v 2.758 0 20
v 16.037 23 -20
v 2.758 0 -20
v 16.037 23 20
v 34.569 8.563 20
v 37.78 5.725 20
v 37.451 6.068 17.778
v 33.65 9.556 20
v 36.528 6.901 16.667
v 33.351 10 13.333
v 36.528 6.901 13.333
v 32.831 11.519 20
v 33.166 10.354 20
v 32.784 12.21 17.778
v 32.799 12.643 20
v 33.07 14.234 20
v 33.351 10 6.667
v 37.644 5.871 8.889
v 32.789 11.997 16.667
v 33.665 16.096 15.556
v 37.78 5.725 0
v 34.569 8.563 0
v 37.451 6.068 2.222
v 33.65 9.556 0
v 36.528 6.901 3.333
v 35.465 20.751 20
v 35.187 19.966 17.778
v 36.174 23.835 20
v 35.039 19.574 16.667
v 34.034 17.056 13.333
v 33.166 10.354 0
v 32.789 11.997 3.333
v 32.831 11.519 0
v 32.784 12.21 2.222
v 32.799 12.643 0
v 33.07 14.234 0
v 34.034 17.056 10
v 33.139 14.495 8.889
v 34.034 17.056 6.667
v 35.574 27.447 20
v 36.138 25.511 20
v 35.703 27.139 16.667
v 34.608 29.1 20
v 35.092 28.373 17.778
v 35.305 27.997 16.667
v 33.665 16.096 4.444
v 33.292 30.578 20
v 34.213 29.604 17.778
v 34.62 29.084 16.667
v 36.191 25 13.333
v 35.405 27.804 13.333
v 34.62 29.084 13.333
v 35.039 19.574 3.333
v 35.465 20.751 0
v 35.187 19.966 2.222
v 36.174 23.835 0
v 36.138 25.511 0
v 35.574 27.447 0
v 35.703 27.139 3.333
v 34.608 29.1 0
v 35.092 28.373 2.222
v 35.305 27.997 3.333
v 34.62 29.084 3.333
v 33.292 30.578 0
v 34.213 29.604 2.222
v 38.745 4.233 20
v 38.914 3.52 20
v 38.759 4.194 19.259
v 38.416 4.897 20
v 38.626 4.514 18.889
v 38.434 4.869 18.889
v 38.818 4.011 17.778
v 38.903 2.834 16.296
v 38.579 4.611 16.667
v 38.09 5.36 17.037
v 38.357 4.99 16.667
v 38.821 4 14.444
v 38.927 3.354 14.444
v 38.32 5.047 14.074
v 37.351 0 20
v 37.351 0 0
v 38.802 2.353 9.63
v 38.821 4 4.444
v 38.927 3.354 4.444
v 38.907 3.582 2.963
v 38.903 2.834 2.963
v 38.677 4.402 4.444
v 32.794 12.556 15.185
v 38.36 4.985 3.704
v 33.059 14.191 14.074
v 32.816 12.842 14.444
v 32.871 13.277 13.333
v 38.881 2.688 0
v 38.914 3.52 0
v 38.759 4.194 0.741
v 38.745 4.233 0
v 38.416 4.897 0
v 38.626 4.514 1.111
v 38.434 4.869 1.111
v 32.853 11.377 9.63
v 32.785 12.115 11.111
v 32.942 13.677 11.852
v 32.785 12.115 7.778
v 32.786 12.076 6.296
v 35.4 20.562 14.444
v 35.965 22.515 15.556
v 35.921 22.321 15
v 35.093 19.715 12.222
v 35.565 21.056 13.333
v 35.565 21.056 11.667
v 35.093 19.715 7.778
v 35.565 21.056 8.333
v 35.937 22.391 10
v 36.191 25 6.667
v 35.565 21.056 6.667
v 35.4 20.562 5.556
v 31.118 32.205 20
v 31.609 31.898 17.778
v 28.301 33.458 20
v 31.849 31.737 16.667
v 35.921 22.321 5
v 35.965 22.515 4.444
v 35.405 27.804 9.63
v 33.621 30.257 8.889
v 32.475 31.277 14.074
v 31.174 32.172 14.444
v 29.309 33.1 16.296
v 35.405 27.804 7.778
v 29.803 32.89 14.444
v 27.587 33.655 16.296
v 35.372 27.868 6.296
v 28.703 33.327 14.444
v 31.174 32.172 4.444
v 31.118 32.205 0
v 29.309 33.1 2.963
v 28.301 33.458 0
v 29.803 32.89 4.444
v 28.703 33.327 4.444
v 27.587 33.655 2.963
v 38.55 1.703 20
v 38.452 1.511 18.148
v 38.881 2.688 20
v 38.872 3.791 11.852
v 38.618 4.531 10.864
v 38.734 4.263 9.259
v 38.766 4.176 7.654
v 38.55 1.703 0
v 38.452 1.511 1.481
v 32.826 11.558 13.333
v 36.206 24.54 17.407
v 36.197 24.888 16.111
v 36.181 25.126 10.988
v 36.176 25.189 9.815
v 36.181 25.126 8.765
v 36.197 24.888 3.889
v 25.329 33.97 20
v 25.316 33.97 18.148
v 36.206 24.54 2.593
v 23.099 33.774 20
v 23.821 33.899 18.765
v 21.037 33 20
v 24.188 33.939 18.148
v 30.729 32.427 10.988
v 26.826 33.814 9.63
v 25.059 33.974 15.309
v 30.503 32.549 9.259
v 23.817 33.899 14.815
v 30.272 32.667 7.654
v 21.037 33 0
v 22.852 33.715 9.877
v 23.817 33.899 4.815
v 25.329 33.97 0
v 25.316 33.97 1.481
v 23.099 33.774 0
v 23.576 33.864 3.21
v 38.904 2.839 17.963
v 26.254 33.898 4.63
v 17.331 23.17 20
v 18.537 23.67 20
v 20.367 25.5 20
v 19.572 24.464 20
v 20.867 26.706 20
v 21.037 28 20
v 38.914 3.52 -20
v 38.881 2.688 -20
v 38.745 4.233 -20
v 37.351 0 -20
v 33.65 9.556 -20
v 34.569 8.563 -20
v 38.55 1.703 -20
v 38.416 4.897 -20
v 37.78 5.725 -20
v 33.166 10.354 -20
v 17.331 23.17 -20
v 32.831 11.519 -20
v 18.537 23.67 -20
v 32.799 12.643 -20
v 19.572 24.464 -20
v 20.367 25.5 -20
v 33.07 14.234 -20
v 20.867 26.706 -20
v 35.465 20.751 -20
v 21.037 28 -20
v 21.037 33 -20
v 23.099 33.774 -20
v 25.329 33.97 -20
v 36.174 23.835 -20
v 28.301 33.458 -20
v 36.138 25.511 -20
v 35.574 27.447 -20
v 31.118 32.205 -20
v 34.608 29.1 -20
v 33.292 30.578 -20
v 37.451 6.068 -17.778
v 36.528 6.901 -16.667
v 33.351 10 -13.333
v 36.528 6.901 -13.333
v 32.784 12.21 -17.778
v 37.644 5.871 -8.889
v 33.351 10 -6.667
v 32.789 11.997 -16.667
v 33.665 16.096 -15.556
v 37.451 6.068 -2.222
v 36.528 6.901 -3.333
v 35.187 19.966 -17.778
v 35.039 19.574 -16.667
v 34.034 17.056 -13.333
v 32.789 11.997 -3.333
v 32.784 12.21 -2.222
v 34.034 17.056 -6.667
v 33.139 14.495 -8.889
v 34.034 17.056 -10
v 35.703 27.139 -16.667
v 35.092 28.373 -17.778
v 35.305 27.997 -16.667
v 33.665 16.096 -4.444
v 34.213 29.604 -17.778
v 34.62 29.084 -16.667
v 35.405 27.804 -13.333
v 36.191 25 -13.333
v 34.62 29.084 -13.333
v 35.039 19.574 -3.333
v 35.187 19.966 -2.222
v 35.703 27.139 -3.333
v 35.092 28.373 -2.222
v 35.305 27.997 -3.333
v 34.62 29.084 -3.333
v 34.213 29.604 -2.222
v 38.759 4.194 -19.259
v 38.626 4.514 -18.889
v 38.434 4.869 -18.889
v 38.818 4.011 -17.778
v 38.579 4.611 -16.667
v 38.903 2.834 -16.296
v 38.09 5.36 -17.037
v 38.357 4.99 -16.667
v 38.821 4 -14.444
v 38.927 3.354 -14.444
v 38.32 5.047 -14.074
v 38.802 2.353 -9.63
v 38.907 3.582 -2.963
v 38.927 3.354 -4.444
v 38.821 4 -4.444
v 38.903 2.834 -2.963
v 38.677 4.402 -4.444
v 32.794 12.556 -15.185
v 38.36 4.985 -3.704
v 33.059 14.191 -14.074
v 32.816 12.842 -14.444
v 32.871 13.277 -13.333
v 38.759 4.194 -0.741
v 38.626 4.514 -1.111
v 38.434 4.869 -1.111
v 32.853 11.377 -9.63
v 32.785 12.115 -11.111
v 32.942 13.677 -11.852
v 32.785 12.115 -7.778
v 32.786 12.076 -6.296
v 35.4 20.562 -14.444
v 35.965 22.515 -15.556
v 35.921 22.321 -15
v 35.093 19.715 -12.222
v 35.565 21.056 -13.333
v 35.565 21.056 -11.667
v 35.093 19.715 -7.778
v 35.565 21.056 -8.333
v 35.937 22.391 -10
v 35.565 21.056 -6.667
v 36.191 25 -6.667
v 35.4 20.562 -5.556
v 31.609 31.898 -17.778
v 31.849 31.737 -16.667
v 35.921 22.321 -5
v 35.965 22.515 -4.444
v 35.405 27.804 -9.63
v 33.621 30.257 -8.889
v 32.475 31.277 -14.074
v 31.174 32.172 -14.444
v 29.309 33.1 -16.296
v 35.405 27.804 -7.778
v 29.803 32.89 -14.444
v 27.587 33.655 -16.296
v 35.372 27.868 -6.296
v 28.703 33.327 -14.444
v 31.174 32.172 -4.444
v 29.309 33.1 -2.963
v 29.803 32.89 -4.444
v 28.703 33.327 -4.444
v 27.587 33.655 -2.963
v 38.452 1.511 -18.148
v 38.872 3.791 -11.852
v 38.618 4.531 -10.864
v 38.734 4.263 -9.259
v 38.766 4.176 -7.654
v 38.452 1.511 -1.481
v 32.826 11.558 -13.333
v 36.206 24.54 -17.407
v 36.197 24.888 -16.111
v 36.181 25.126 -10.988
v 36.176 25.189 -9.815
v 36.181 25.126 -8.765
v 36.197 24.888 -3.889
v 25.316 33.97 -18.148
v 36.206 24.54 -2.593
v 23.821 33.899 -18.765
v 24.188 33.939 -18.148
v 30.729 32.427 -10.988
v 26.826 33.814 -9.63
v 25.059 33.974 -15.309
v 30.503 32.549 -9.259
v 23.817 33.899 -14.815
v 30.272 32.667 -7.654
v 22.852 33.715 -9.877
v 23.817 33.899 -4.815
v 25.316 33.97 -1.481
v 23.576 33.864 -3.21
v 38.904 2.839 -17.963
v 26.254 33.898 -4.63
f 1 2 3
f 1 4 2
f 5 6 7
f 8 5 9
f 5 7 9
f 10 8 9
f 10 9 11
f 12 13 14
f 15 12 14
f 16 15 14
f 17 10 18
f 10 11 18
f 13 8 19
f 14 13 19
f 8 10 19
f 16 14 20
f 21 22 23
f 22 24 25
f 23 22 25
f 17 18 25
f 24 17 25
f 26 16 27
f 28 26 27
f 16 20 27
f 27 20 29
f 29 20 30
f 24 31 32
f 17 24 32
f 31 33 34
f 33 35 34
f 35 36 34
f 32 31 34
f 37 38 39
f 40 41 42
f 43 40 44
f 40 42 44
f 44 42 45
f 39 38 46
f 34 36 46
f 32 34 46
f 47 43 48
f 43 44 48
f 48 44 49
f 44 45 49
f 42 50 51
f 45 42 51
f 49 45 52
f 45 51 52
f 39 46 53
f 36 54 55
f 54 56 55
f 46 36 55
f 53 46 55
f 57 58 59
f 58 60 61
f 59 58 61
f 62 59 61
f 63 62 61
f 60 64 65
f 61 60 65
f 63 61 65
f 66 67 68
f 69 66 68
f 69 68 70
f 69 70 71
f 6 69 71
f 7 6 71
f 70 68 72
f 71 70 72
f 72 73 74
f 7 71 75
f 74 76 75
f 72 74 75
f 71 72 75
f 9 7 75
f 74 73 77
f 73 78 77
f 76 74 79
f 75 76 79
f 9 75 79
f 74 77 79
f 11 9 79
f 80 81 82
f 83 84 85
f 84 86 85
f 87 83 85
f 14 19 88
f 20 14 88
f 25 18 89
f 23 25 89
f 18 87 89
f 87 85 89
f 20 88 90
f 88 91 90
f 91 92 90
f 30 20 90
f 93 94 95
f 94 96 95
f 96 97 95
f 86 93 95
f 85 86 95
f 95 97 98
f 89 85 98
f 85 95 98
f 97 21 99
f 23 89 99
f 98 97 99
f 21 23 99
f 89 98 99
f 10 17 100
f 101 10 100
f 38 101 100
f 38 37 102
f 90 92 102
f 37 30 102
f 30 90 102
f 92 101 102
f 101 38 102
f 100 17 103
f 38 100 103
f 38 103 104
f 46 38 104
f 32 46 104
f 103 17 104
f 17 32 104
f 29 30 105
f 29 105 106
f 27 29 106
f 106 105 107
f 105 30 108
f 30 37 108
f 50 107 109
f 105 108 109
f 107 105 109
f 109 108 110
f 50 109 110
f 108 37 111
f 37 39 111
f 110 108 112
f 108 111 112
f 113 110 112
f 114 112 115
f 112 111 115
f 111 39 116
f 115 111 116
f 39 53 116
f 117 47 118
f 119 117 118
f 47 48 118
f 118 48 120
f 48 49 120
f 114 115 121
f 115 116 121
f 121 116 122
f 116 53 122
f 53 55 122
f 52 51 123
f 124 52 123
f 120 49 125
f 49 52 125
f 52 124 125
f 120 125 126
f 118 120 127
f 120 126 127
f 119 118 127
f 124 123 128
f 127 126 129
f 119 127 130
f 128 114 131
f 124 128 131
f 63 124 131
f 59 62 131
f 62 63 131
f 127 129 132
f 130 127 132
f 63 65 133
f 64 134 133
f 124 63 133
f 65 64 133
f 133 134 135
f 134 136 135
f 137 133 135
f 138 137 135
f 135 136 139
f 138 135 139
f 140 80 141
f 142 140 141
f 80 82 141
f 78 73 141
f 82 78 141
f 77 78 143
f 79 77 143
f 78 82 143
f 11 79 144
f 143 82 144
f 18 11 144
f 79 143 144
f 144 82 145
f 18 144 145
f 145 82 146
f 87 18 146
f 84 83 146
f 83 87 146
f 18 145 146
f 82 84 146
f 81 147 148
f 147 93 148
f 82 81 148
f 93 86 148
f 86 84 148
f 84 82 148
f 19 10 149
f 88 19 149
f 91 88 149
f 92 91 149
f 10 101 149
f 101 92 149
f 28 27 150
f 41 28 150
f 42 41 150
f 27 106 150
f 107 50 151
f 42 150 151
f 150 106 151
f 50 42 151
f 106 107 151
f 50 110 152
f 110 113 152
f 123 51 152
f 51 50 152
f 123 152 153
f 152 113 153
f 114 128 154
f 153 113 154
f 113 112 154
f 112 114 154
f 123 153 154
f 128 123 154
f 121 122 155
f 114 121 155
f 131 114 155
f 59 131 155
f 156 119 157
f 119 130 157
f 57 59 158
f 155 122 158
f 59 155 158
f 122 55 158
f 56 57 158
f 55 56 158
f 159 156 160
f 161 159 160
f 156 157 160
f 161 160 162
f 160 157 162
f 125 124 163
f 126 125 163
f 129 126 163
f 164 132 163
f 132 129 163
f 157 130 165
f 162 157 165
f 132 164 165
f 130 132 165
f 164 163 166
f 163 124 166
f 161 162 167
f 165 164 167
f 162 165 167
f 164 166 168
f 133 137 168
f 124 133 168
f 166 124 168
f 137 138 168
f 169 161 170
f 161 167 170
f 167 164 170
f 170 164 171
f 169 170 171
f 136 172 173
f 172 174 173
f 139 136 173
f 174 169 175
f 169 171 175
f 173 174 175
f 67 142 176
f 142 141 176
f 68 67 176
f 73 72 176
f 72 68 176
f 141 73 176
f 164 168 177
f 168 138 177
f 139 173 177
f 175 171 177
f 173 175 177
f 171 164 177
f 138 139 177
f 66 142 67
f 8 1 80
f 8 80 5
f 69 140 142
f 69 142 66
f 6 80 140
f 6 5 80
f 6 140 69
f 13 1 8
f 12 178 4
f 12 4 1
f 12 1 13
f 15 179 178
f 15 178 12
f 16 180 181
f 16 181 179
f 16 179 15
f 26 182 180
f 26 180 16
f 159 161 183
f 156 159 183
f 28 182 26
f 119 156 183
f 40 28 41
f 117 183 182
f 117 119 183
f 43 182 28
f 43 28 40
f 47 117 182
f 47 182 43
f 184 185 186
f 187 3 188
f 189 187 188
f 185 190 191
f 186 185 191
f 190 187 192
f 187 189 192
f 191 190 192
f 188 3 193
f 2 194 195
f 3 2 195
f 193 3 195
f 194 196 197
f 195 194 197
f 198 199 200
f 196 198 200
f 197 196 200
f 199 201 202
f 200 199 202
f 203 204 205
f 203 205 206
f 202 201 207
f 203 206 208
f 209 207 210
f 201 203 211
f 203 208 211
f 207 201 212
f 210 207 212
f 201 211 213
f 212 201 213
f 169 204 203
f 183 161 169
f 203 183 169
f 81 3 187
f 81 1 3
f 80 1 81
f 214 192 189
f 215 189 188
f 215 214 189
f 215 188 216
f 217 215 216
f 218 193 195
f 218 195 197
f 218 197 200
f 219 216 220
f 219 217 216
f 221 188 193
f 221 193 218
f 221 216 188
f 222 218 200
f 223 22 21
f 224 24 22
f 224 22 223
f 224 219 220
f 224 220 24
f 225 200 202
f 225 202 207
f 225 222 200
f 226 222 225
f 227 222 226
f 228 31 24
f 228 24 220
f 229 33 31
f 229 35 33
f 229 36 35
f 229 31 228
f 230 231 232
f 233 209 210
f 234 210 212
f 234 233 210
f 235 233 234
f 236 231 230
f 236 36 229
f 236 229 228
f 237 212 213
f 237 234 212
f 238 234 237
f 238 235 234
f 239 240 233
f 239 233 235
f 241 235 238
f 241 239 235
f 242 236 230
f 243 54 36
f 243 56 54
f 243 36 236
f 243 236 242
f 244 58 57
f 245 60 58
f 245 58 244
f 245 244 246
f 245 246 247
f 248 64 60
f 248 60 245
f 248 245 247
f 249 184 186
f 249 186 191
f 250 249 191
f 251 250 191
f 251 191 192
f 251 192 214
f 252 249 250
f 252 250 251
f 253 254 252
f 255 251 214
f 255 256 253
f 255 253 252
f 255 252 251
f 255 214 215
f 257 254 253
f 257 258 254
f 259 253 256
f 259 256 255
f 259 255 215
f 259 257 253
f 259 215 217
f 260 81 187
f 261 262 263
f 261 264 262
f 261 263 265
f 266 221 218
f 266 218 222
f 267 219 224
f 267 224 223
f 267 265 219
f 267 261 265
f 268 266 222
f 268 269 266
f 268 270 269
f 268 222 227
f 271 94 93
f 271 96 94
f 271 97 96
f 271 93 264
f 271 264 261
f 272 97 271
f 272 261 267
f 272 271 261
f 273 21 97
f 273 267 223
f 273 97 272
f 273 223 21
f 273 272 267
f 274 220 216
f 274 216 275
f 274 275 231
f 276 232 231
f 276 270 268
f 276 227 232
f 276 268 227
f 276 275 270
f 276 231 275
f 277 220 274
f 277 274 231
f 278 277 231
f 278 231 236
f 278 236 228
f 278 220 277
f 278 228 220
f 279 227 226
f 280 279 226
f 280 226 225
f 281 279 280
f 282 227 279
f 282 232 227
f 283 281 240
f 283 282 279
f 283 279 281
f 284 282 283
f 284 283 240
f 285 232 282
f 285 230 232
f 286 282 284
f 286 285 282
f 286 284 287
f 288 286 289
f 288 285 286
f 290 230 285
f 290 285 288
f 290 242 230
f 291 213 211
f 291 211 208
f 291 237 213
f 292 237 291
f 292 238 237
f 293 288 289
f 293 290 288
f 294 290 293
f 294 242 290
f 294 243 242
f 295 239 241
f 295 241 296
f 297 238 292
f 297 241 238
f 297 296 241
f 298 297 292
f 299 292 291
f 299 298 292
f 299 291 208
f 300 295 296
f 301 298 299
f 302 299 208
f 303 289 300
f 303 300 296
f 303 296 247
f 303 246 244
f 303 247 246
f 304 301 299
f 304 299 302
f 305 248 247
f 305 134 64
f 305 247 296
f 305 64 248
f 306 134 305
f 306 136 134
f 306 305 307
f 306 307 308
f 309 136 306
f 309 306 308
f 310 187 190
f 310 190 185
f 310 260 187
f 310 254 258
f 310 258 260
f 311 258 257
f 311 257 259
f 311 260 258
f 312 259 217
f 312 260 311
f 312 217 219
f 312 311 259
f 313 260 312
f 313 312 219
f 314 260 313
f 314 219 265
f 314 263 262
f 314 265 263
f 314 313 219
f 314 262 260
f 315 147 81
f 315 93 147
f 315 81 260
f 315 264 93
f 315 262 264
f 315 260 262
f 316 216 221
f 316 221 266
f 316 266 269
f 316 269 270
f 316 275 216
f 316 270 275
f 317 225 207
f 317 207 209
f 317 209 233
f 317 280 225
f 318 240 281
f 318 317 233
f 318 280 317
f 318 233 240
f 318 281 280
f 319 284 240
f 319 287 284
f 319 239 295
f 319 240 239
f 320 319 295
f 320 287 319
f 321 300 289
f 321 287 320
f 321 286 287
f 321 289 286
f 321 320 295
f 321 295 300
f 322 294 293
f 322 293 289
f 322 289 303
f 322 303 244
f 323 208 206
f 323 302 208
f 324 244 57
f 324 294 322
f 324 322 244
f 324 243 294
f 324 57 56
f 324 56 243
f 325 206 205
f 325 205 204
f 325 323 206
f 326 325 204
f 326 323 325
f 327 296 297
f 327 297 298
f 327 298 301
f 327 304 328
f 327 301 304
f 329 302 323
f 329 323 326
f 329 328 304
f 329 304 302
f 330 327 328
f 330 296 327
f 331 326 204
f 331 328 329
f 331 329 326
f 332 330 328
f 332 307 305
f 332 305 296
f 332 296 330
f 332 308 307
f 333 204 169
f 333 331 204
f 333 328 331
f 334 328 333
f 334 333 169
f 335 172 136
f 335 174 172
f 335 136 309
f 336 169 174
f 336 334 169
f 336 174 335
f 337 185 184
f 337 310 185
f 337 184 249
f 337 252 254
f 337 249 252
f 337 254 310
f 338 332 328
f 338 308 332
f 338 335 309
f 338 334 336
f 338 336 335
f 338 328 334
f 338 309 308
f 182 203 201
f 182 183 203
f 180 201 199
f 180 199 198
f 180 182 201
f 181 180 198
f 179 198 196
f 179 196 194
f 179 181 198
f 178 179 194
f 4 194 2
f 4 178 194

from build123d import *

# Parameters (mm, degrees)
BOSS_EXTRU_1_DEPTH = 20


with BuildPart() as part:
    # Esquisse1 → Boss.-Extru.1 (new, symmetric)
    with BuildSketch(Plane.XY):
        with BuildLine():
            Line((2.757835538, 0), (37.350688144, 0))
            add(Edge.make_bspline(
                [(37.350688144, 0), (41.962405292, 5.087288514), (26.683241818, 9.133861582), (43.232235369, 27.239644515), (26.656278771, 36.134424551), (21.036891729, 33)],
                knots=[0, 0, 0, 0, 0.263847528, 0.594826113, 1, 1, 1, 1], degree=3))
            Line((21.036891729, 33), (21.036891729, 28))
            ThreePointArc((21.036891729, 28), (19.572425635, 24.464466094), (16.036891729, 23))
            Line((16.036891729, 23), (2.757835538, 0))
        make_face()
    extrude(amount=BOSS_EXTRU_1_DEPTH, both=True)


solid = part.part
